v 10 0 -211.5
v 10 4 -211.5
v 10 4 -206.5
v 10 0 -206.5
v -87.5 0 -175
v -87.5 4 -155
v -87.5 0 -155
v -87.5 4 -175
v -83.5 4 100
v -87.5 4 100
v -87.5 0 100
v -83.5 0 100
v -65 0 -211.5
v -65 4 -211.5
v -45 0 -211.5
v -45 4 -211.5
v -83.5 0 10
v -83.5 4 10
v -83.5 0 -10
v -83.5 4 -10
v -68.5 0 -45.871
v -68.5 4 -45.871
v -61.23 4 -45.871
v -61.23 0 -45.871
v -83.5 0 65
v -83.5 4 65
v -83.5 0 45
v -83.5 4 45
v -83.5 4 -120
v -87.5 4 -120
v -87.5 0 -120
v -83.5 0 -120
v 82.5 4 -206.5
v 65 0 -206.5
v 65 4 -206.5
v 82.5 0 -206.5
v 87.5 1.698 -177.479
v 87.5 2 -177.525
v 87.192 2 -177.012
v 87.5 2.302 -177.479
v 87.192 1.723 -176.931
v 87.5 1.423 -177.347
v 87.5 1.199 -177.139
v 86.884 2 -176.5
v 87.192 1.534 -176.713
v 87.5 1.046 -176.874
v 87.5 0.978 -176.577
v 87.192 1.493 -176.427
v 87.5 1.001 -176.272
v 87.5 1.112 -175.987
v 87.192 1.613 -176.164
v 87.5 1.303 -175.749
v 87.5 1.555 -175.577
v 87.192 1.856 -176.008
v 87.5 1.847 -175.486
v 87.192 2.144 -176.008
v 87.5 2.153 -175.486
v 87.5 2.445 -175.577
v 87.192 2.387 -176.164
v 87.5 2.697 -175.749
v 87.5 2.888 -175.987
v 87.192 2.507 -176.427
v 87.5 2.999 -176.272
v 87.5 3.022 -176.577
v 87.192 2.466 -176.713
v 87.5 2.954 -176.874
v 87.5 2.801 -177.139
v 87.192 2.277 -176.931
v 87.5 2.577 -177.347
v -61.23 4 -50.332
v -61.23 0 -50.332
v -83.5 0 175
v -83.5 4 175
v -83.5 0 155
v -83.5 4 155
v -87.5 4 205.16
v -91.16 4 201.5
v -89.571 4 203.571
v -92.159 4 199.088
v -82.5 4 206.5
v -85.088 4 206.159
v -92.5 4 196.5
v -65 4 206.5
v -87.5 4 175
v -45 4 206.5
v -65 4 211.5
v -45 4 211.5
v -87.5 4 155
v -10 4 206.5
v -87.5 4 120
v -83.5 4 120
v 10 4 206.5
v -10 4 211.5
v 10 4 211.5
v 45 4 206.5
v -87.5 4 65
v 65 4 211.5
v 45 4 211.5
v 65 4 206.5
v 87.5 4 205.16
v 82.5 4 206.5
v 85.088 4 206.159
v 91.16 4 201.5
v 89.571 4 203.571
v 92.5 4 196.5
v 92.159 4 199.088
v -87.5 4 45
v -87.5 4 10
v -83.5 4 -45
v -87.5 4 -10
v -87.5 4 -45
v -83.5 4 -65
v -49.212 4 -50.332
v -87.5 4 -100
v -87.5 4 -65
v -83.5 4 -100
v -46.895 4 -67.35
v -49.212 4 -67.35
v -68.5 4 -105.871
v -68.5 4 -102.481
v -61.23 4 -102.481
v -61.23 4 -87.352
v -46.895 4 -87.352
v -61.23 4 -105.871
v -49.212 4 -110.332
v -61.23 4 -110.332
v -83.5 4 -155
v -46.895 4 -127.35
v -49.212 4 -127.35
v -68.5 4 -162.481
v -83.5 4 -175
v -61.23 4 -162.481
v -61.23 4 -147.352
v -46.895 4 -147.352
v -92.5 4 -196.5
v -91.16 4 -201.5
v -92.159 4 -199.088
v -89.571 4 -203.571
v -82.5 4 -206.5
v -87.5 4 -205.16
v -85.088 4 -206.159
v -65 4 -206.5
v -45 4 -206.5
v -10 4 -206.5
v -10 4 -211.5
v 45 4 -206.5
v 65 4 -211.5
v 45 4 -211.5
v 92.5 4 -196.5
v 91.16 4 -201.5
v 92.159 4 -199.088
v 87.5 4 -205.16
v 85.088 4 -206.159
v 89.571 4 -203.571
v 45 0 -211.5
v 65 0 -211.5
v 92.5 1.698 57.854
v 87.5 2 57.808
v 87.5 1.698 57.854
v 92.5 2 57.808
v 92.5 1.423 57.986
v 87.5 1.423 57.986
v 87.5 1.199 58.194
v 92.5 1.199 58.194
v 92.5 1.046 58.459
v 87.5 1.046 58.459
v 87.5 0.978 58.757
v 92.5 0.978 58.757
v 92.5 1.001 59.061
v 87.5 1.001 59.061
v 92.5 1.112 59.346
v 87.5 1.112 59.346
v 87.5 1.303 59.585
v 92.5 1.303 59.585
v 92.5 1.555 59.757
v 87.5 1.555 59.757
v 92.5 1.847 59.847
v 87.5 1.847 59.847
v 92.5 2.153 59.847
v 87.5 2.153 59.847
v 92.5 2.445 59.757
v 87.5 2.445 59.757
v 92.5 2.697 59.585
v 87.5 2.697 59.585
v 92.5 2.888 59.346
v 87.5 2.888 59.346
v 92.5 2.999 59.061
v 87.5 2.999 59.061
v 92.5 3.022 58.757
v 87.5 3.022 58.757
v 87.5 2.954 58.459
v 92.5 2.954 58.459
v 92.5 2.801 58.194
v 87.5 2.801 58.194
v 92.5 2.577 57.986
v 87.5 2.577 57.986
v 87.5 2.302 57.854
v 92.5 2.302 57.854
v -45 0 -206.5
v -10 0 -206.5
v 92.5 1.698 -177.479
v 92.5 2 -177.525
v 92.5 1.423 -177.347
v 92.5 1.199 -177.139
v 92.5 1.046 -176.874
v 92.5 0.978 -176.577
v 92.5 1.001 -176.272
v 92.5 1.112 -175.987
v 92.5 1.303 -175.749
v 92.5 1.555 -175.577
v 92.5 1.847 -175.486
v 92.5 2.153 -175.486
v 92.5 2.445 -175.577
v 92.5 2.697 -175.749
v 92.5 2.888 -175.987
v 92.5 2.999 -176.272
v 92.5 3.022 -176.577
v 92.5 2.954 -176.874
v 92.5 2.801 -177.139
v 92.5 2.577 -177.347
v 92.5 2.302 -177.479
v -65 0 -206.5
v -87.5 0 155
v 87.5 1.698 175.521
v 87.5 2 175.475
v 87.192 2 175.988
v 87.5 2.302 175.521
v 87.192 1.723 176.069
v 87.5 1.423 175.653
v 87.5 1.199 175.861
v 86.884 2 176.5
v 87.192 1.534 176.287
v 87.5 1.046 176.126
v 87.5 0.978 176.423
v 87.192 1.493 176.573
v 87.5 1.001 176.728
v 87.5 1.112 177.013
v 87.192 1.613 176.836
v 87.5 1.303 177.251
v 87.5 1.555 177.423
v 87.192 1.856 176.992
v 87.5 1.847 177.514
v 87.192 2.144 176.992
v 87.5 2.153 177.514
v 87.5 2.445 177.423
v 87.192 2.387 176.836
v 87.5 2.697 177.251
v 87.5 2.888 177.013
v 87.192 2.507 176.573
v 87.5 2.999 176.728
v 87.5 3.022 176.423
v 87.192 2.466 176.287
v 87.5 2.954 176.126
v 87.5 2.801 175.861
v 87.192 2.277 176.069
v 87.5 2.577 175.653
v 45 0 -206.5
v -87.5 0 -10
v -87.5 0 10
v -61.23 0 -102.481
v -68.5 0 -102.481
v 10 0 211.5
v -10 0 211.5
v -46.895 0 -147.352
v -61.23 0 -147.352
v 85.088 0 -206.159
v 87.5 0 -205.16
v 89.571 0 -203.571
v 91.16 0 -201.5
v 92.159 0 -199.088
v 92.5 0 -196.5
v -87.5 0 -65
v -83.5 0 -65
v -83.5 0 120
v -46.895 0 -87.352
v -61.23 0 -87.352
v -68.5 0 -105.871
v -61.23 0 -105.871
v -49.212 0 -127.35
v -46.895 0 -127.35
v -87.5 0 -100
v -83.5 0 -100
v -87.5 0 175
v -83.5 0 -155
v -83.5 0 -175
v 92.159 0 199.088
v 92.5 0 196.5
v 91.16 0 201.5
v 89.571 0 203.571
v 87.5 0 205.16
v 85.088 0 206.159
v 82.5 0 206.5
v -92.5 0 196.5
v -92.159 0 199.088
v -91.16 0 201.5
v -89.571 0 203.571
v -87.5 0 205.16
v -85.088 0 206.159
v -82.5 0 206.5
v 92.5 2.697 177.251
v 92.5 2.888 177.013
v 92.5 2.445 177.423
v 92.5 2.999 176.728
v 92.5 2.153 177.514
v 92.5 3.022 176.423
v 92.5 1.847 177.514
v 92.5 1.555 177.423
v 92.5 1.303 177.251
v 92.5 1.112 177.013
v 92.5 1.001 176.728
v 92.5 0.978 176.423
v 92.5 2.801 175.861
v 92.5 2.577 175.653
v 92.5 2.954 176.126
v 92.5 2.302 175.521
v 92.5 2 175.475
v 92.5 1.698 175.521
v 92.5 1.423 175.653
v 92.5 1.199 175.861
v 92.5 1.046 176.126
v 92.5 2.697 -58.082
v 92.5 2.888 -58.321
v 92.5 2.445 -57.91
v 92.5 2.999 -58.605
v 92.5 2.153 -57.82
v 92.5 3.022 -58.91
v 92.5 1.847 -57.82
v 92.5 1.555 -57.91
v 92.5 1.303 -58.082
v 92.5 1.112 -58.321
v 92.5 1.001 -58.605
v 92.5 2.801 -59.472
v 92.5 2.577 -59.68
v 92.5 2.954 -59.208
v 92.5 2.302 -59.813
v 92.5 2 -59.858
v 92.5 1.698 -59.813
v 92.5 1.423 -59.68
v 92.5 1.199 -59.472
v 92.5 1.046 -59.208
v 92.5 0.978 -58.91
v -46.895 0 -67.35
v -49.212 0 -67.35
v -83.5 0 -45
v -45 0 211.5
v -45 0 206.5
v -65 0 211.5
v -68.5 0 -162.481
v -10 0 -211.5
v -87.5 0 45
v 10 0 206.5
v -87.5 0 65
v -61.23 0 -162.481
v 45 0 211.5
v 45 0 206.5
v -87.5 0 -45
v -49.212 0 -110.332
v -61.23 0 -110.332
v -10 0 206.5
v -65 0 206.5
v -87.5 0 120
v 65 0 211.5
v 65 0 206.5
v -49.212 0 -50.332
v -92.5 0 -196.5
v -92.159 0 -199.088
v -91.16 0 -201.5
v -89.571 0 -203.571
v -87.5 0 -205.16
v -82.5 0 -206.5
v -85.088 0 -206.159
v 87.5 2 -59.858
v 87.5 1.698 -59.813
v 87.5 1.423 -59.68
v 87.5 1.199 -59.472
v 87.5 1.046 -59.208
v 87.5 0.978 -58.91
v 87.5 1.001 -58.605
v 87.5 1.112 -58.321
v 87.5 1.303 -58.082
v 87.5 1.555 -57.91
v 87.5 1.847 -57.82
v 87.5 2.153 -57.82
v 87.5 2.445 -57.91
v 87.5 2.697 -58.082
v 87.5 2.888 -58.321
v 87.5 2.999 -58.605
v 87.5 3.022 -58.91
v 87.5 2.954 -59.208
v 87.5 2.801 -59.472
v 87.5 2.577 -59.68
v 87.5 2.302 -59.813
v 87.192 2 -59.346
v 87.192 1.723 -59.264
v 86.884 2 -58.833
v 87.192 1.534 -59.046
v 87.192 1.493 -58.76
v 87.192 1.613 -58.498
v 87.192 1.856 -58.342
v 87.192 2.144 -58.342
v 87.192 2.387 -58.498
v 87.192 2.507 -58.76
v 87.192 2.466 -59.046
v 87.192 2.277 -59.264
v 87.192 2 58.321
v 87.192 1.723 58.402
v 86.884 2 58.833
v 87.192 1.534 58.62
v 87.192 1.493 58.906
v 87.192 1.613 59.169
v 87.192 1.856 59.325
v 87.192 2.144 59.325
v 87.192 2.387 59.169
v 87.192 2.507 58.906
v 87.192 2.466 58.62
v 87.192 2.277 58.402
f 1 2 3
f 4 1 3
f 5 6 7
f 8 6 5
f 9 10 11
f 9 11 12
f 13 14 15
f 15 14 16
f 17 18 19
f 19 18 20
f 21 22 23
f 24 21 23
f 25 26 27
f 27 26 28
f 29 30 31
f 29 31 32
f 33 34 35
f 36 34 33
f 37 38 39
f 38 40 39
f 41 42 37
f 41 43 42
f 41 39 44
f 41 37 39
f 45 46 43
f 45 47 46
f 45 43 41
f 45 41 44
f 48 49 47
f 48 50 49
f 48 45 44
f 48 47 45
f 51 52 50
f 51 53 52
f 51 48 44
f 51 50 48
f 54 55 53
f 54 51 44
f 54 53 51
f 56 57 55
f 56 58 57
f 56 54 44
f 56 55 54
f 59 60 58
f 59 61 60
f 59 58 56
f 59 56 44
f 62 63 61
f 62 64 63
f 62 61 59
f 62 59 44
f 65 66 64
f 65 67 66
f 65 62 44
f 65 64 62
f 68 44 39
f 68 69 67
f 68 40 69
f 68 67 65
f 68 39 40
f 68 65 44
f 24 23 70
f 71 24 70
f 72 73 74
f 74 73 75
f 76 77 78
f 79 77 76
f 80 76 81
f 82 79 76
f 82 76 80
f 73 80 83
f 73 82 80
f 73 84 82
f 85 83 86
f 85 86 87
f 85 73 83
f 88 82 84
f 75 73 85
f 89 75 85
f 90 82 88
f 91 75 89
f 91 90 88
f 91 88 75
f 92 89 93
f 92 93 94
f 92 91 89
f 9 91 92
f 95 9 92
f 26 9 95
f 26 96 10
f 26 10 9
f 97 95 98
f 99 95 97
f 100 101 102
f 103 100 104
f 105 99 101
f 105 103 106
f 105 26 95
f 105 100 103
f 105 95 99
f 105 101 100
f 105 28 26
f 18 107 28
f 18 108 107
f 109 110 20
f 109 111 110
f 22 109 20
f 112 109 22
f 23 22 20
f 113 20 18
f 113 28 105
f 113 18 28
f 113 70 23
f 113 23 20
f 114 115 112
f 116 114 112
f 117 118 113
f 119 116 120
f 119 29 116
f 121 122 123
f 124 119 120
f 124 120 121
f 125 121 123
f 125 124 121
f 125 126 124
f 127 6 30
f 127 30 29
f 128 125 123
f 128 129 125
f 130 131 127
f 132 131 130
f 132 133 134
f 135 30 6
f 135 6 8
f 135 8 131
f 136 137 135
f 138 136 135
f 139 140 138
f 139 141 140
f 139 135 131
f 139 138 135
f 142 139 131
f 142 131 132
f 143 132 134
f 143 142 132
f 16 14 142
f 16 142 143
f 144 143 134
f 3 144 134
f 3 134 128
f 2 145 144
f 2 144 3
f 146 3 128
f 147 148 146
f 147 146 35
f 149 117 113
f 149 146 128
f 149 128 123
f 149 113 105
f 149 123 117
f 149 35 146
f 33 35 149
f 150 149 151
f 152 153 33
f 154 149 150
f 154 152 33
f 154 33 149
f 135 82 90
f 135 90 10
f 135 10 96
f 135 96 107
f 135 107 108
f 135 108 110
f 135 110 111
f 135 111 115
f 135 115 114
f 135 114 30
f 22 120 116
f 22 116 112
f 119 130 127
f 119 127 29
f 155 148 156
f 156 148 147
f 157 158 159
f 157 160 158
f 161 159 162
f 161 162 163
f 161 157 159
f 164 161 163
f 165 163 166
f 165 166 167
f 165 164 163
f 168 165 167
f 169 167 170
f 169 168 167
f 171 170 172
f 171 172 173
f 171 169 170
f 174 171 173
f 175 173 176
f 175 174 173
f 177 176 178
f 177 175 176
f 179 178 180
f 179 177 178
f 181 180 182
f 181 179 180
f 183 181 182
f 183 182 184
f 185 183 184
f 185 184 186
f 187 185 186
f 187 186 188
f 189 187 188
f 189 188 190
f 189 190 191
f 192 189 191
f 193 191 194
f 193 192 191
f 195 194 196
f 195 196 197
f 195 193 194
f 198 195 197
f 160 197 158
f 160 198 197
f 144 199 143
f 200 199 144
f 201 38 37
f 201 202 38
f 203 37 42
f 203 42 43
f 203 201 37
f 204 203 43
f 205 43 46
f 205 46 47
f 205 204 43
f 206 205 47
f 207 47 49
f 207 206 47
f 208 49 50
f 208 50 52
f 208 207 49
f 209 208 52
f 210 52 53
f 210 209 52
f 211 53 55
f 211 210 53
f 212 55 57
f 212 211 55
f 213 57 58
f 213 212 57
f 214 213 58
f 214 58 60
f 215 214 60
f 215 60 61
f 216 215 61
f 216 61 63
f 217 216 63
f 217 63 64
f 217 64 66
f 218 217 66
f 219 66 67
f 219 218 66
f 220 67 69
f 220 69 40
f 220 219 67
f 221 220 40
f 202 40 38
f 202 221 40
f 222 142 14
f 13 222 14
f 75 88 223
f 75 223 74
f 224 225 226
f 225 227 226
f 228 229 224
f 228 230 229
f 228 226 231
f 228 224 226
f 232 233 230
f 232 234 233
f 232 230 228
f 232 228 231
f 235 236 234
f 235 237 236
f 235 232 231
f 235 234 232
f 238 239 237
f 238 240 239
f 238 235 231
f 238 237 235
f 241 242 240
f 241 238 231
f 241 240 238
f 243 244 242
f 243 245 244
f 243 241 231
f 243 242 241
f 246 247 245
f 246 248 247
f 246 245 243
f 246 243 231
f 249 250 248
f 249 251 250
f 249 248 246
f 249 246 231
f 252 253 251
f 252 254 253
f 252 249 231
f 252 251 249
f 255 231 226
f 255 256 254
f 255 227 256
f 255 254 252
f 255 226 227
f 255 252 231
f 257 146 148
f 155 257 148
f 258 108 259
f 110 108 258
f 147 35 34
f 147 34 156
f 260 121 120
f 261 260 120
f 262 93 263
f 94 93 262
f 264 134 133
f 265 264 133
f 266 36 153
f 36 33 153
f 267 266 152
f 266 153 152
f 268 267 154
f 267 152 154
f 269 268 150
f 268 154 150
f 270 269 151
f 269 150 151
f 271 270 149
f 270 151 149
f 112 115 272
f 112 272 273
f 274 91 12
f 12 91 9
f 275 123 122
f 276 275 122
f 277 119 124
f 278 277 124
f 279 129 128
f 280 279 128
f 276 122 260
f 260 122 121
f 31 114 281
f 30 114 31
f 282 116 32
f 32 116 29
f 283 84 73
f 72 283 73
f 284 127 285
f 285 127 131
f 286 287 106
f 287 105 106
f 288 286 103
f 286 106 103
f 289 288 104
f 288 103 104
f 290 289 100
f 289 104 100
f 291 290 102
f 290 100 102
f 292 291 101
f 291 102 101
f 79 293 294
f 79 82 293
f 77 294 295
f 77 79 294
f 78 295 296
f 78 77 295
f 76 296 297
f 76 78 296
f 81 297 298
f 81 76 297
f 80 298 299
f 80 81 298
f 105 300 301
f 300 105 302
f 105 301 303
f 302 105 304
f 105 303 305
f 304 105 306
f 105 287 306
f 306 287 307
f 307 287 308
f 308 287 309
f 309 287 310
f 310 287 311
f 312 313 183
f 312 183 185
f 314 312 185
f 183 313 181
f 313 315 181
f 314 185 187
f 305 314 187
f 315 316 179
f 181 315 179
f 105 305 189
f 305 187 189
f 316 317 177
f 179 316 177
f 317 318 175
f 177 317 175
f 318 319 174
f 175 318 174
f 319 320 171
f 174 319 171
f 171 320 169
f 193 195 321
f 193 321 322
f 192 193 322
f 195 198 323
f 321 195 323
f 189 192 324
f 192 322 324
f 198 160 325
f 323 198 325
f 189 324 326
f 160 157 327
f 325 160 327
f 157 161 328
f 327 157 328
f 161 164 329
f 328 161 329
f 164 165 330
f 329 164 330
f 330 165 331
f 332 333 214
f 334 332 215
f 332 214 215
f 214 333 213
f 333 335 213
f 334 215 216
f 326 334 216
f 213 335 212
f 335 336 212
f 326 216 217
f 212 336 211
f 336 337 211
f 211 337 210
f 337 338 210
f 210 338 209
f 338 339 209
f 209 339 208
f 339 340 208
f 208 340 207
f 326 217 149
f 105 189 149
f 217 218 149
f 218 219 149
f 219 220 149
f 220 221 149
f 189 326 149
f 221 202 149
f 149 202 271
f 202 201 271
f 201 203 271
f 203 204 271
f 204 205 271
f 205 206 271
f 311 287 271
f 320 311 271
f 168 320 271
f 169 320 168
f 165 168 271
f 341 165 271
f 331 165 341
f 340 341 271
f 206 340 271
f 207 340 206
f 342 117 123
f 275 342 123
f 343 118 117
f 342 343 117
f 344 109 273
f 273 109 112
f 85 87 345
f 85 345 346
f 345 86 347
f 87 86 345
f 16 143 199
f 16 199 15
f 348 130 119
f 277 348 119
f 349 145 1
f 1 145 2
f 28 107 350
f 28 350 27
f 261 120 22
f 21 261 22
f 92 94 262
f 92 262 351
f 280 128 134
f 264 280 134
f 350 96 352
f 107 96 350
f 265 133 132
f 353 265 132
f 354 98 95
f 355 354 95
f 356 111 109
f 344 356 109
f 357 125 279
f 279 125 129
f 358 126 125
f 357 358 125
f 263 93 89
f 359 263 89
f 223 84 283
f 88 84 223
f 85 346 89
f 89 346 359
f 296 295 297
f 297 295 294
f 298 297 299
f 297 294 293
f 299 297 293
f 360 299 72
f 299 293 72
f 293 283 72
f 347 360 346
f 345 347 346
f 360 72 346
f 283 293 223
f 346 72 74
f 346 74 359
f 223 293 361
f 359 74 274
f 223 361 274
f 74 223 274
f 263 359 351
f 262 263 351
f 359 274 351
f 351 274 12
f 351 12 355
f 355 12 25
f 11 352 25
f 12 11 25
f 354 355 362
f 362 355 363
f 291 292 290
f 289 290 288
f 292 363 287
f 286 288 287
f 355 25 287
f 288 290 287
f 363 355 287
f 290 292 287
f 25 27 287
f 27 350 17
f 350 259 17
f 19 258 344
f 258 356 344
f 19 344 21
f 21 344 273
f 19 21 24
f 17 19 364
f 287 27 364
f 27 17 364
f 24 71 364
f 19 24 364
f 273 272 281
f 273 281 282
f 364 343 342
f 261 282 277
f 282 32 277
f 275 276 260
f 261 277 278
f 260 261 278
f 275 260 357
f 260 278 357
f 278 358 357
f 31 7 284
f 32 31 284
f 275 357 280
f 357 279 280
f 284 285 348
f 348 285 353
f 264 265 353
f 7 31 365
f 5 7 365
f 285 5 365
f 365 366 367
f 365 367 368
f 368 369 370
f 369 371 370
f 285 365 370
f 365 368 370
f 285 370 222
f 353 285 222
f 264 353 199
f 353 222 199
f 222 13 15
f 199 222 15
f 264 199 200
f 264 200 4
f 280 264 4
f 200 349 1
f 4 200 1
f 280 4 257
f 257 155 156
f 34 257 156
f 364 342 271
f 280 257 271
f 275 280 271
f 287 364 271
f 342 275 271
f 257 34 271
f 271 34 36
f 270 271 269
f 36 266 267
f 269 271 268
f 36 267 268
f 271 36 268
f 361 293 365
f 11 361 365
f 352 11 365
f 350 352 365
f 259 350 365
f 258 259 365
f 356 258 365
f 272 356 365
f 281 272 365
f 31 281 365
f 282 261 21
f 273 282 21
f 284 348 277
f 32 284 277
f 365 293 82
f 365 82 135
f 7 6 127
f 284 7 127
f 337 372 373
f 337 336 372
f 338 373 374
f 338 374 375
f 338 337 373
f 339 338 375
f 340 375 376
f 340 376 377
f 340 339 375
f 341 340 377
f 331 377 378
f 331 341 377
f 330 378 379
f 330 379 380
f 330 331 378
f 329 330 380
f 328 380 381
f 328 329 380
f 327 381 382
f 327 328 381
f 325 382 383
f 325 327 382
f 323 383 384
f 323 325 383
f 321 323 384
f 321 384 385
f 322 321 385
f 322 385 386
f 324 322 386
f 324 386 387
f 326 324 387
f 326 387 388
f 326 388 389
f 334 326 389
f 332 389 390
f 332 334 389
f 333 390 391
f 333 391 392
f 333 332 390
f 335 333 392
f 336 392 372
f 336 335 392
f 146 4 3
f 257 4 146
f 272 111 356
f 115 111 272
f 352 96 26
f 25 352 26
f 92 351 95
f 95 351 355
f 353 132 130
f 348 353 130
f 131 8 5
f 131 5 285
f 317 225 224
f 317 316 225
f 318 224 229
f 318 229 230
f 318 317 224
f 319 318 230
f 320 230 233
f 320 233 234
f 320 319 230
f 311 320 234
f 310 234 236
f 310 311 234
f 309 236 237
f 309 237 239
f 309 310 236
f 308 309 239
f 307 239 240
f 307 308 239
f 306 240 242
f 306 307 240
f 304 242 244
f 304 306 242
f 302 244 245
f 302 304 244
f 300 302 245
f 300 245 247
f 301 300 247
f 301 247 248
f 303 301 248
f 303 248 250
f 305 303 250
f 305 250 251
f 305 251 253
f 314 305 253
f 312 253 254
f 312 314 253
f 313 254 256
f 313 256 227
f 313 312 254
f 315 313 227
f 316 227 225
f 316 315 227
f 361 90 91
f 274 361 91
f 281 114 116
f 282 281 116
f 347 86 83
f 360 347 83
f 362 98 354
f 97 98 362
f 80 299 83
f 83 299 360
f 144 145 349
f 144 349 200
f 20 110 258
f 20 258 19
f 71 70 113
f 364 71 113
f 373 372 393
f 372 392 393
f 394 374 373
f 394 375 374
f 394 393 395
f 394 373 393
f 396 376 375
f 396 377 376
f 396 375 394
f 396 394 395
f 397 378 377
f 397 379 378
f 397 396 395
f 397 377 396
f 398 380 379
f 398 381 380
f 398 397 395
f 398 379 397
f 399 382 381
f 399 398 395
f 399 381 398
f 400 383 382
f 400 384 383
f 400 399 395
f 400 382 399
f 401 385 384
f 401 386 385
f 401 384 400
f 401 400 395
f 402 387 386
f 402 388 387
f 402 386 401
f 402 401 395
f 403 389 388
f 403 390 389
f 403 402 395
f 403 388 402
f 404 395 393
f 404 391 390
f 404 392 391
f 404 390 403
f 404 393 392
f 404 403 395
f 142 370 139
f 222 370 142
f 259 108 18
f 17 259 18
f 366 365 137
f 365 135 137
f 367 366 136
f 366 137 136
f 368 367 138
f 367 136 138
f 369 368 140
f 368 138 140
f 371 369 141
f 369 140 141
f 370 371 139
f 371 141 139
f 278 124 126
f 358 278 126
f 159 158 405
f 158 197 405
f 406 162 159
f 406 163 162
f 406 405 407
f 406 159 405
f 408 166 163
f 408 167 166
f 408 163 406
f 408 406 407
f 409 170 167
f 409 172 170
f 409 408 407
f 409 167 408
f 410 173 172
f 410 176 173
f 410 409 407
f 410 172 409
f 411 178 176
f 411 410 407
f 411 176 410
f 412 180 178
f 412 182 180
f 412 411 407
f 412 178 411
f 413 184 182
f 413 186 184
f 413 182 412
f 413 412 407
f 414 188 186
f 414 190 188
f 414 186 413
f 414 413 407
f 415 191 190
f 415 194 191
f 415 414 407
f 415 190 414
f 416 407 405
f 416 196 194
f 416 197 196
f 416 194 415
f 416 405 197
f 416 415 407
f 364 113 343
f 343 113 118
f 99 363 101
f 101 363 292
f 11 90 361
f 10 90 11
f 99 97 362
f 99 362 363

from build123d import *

# Parameters (mm, degrees)
SKETCH1_W               = 185
SKETCH1_H               = 413
BASE_DEPTH              = 4
SKETCH2_W               = 20
SKETCH2_H               = 5
BOSS_EXTRUDE2_DEPTH     = 4
LPATTERN1_COUNT         = 2
LPATTERN1_PITCH         = 55
LPATTERN1_COL_COUNT     = 2
LPATTERN1_COL_PITCH     = 55
SKETCH3_W               = 4
SKETCH3_H               = 20
CUT_EXTRUDE1_DEPTH      = 231.877673238
LPATTERN2_COUNT         = 4
LPATTERN2_PITCH         = 55
LPATTERN2_COL_COUNT     = 4
LPATTERN2_COL_PITCH     = 55
FILLET1_R               = 10
MIRROR1_COPY_1_SKETCH_W = 20
MIRROR1_COPY_1_SKETCH_H = 5
MIRROR1_COPY_1_DEPTH    = 4
MIRROR1_COPY_2_SKETCH_W = 20
MIRROR1_COPY_2_SKETCH_H = 5
MIRROR1_COPY_2_DEPTH    = 4
CUT_EXTRUDE4_DEPTH      = 231.877673238
LPATTERN5_COUNT         = 4
LPATTERN5_PITCH         = 117.666666667


with BuildPart() as part:
    # Sketch1 → Base (new body)
    with BuildSketch(Plane(origin=(0, 0, 0), x_dir=(1, 0, 0), z_dir=(0, 1, 0))):
        Rectangle(SKETCH1_W, SKETCH1_H)
    extrude(amount=BASE_DEPTH)

    # Sketch2 → Boss-Extrude2 (add)
    with BuildSketch(Plane(origin=(0, 4, 0), x_dir=(1, 0, 0), z_dir=(0, 1, 0))):
        with Locations((0, -209)):
            Rectangle(SKETCH2_W, SKETCH2_H)
    boss_extrude2 = extrude(amount=-BOSS_EXTRUDE2_DEPTH)

    # LPattern1: Boss-Extrude2 ×2
    with Locations(*[(-i * LPATTERN1_PITCH, 0, 0) for i in range(1, LPATTERN1_COUNT)]):
        add(boss_extrude2)

    # LPattern1 col: Boss-Extrude2 ×2
    with Locations(*[(i * LPATTERN1_COL_PITCH, 0, 0) for i in range(1, LPATTERN1_COL_COUNT)]):
        add(boss_extrude2)

    # Sketch3 → Cut-Extrude1 (cut, through all)
    with BuildSketch(Plane(origin=(0, 4, 0), x_dir=(1, 0, 0), z_dir=(0, 1, 0))):
        with Locations((-85.5, 0)):
            Rectangle(SKETCH3_W, SKETCH3_H)
    cut_extrude1 = extrude(amount=-CUT_EXTRUDE1_DEPTH, mode=Mode.SUBTRACT)

    # LPattern2: Cut-Extrude1 ×4
    with Locations(*[(0, 0, -i * LPATTERN2_PITCH) for i in range(1, LPATTERN2_COUNT)]):
        add(cut_extrude1, mode=Mode.SUBTRACT)

    # LPattern2 col: Cut-Extrude1 ×4
    with Locations(*[(0, 0, i * LPATTERN2_COL_PITCH) for i in range(1, LPATTERN2_COL_COUNT)]):
        add(cut_extrude1, mode=Mode.SUBTRACT)

    # Fillet1
    fillet1_edges = [part.edges().sort_by_distance(p)[0] for p in [
        (-92.5, 2, -206.5),
        (92.5, 2, -206.5),
        (92.5, 2, 206.5),
        (-92.5, 2, 206.5),
    ]]
    fillet(fillet1_edges, radius=FILLET1_R)

    # Mirror1: Boss-Extrude2 across plane
    add(boss_extrude2.mirror(Plane.XY))

    # Mirror1 copy 1 sketch → Mirror1 copy 1 (add)
    with BuildSketch(Plane(origin=(-55, 4, 0), x_dir=(1, 0, 0), z_dir=(0, 1, 0))):
        with Locations((0, 209)):
            Rectangle(MIRROR1_COPY_1_SKETCH_W, MIRROR1_COPY_1_SKETCH_H)
    extrude(amount=-MIRROR1_COPY_1_DEPTH)

    # Mirror1 copy 2 sketch → Mirror1 copy 2 (add)
    with BuildSketch(Plane(origin=(55, 4, 0), x_dir=(1, 0, 0), z_dir=(0, 1, 0))):
        with Locations((0, 209)):
            Rectangle(MIRROR1_COPY_2_SKETCH_W, MIRROR1_COPY_2_SKETCH_H)
    extrude(amount=-MIRROR1_COPY_2_DEPTH)

    # Sketch5 → Cut-Extrude4 (cut, through all)
    with BuildSketch(Plane(origin=(0, 4, 0), x_dir=(1, 0, 0), z_dir=(0, 1, 0))):
        Polygon((-46.895000001, 87.351848615), (-61.230000001, 87.351848615), (-61.230000001, 102.480848615), (-68.500000001, 102.480848615), (-68.500000001, 45.870848615), (-61.230000001, 45.870848615), (-61.230000001, 50.331848615), (-49.211989258, 50.331848615), (-49.211989258, 67.349848615), (-46.895000001, 67.349848615), align=None)
        Polygon((-46.895000001, 147.351848615), (-61.230000001, 147.351848615), (-61.230000001, 162.480848615), (-68.500000001, 162.480848615), (-68.500000001, 105.870848615), (-61.230000001, 105.870848615), (-61.230000001, 110.331848615), (-49.211989258, 110.331848615), (-49.211989258, 127.349848615), (-46.895000001, 127.349848615), align=None)
    extrude(amount=-CUT_EXTRUDE4_DEPTH, mode=Mode.SUBTRACT)

    # Sketch8 → Tap Drill for M2.5x0.45 Tap1 (revolve, cut)
    with BuildSketch(Plane(origin=(92.5, 2, -176.5), x_dir=(0, 0, -1), z_dir=(0, 1, 0))):
        Polygon((0, 0), (0, 5.615882135), (1.025, 5), (1.025, 0), align=None)
    tap_drill_for_m2_5x0_45_tap1 = revolve(axis=Axis((98.85, 2, -176.5), (-1, 0, 0)), mode=Mode.SUBTRACT)

    # LPattern5: Tap Drill for M2.5x0.45 Tap1 ×4
    with Locations(*[(0, 0, i * LPATTERN5_PITCH) for i in range(1, LPATTERN5_COUNT)]):
        add(tap_drill_for_m2_5x0_45_tap1, mode=Mode.SUBTRACT)


solid = part.part
